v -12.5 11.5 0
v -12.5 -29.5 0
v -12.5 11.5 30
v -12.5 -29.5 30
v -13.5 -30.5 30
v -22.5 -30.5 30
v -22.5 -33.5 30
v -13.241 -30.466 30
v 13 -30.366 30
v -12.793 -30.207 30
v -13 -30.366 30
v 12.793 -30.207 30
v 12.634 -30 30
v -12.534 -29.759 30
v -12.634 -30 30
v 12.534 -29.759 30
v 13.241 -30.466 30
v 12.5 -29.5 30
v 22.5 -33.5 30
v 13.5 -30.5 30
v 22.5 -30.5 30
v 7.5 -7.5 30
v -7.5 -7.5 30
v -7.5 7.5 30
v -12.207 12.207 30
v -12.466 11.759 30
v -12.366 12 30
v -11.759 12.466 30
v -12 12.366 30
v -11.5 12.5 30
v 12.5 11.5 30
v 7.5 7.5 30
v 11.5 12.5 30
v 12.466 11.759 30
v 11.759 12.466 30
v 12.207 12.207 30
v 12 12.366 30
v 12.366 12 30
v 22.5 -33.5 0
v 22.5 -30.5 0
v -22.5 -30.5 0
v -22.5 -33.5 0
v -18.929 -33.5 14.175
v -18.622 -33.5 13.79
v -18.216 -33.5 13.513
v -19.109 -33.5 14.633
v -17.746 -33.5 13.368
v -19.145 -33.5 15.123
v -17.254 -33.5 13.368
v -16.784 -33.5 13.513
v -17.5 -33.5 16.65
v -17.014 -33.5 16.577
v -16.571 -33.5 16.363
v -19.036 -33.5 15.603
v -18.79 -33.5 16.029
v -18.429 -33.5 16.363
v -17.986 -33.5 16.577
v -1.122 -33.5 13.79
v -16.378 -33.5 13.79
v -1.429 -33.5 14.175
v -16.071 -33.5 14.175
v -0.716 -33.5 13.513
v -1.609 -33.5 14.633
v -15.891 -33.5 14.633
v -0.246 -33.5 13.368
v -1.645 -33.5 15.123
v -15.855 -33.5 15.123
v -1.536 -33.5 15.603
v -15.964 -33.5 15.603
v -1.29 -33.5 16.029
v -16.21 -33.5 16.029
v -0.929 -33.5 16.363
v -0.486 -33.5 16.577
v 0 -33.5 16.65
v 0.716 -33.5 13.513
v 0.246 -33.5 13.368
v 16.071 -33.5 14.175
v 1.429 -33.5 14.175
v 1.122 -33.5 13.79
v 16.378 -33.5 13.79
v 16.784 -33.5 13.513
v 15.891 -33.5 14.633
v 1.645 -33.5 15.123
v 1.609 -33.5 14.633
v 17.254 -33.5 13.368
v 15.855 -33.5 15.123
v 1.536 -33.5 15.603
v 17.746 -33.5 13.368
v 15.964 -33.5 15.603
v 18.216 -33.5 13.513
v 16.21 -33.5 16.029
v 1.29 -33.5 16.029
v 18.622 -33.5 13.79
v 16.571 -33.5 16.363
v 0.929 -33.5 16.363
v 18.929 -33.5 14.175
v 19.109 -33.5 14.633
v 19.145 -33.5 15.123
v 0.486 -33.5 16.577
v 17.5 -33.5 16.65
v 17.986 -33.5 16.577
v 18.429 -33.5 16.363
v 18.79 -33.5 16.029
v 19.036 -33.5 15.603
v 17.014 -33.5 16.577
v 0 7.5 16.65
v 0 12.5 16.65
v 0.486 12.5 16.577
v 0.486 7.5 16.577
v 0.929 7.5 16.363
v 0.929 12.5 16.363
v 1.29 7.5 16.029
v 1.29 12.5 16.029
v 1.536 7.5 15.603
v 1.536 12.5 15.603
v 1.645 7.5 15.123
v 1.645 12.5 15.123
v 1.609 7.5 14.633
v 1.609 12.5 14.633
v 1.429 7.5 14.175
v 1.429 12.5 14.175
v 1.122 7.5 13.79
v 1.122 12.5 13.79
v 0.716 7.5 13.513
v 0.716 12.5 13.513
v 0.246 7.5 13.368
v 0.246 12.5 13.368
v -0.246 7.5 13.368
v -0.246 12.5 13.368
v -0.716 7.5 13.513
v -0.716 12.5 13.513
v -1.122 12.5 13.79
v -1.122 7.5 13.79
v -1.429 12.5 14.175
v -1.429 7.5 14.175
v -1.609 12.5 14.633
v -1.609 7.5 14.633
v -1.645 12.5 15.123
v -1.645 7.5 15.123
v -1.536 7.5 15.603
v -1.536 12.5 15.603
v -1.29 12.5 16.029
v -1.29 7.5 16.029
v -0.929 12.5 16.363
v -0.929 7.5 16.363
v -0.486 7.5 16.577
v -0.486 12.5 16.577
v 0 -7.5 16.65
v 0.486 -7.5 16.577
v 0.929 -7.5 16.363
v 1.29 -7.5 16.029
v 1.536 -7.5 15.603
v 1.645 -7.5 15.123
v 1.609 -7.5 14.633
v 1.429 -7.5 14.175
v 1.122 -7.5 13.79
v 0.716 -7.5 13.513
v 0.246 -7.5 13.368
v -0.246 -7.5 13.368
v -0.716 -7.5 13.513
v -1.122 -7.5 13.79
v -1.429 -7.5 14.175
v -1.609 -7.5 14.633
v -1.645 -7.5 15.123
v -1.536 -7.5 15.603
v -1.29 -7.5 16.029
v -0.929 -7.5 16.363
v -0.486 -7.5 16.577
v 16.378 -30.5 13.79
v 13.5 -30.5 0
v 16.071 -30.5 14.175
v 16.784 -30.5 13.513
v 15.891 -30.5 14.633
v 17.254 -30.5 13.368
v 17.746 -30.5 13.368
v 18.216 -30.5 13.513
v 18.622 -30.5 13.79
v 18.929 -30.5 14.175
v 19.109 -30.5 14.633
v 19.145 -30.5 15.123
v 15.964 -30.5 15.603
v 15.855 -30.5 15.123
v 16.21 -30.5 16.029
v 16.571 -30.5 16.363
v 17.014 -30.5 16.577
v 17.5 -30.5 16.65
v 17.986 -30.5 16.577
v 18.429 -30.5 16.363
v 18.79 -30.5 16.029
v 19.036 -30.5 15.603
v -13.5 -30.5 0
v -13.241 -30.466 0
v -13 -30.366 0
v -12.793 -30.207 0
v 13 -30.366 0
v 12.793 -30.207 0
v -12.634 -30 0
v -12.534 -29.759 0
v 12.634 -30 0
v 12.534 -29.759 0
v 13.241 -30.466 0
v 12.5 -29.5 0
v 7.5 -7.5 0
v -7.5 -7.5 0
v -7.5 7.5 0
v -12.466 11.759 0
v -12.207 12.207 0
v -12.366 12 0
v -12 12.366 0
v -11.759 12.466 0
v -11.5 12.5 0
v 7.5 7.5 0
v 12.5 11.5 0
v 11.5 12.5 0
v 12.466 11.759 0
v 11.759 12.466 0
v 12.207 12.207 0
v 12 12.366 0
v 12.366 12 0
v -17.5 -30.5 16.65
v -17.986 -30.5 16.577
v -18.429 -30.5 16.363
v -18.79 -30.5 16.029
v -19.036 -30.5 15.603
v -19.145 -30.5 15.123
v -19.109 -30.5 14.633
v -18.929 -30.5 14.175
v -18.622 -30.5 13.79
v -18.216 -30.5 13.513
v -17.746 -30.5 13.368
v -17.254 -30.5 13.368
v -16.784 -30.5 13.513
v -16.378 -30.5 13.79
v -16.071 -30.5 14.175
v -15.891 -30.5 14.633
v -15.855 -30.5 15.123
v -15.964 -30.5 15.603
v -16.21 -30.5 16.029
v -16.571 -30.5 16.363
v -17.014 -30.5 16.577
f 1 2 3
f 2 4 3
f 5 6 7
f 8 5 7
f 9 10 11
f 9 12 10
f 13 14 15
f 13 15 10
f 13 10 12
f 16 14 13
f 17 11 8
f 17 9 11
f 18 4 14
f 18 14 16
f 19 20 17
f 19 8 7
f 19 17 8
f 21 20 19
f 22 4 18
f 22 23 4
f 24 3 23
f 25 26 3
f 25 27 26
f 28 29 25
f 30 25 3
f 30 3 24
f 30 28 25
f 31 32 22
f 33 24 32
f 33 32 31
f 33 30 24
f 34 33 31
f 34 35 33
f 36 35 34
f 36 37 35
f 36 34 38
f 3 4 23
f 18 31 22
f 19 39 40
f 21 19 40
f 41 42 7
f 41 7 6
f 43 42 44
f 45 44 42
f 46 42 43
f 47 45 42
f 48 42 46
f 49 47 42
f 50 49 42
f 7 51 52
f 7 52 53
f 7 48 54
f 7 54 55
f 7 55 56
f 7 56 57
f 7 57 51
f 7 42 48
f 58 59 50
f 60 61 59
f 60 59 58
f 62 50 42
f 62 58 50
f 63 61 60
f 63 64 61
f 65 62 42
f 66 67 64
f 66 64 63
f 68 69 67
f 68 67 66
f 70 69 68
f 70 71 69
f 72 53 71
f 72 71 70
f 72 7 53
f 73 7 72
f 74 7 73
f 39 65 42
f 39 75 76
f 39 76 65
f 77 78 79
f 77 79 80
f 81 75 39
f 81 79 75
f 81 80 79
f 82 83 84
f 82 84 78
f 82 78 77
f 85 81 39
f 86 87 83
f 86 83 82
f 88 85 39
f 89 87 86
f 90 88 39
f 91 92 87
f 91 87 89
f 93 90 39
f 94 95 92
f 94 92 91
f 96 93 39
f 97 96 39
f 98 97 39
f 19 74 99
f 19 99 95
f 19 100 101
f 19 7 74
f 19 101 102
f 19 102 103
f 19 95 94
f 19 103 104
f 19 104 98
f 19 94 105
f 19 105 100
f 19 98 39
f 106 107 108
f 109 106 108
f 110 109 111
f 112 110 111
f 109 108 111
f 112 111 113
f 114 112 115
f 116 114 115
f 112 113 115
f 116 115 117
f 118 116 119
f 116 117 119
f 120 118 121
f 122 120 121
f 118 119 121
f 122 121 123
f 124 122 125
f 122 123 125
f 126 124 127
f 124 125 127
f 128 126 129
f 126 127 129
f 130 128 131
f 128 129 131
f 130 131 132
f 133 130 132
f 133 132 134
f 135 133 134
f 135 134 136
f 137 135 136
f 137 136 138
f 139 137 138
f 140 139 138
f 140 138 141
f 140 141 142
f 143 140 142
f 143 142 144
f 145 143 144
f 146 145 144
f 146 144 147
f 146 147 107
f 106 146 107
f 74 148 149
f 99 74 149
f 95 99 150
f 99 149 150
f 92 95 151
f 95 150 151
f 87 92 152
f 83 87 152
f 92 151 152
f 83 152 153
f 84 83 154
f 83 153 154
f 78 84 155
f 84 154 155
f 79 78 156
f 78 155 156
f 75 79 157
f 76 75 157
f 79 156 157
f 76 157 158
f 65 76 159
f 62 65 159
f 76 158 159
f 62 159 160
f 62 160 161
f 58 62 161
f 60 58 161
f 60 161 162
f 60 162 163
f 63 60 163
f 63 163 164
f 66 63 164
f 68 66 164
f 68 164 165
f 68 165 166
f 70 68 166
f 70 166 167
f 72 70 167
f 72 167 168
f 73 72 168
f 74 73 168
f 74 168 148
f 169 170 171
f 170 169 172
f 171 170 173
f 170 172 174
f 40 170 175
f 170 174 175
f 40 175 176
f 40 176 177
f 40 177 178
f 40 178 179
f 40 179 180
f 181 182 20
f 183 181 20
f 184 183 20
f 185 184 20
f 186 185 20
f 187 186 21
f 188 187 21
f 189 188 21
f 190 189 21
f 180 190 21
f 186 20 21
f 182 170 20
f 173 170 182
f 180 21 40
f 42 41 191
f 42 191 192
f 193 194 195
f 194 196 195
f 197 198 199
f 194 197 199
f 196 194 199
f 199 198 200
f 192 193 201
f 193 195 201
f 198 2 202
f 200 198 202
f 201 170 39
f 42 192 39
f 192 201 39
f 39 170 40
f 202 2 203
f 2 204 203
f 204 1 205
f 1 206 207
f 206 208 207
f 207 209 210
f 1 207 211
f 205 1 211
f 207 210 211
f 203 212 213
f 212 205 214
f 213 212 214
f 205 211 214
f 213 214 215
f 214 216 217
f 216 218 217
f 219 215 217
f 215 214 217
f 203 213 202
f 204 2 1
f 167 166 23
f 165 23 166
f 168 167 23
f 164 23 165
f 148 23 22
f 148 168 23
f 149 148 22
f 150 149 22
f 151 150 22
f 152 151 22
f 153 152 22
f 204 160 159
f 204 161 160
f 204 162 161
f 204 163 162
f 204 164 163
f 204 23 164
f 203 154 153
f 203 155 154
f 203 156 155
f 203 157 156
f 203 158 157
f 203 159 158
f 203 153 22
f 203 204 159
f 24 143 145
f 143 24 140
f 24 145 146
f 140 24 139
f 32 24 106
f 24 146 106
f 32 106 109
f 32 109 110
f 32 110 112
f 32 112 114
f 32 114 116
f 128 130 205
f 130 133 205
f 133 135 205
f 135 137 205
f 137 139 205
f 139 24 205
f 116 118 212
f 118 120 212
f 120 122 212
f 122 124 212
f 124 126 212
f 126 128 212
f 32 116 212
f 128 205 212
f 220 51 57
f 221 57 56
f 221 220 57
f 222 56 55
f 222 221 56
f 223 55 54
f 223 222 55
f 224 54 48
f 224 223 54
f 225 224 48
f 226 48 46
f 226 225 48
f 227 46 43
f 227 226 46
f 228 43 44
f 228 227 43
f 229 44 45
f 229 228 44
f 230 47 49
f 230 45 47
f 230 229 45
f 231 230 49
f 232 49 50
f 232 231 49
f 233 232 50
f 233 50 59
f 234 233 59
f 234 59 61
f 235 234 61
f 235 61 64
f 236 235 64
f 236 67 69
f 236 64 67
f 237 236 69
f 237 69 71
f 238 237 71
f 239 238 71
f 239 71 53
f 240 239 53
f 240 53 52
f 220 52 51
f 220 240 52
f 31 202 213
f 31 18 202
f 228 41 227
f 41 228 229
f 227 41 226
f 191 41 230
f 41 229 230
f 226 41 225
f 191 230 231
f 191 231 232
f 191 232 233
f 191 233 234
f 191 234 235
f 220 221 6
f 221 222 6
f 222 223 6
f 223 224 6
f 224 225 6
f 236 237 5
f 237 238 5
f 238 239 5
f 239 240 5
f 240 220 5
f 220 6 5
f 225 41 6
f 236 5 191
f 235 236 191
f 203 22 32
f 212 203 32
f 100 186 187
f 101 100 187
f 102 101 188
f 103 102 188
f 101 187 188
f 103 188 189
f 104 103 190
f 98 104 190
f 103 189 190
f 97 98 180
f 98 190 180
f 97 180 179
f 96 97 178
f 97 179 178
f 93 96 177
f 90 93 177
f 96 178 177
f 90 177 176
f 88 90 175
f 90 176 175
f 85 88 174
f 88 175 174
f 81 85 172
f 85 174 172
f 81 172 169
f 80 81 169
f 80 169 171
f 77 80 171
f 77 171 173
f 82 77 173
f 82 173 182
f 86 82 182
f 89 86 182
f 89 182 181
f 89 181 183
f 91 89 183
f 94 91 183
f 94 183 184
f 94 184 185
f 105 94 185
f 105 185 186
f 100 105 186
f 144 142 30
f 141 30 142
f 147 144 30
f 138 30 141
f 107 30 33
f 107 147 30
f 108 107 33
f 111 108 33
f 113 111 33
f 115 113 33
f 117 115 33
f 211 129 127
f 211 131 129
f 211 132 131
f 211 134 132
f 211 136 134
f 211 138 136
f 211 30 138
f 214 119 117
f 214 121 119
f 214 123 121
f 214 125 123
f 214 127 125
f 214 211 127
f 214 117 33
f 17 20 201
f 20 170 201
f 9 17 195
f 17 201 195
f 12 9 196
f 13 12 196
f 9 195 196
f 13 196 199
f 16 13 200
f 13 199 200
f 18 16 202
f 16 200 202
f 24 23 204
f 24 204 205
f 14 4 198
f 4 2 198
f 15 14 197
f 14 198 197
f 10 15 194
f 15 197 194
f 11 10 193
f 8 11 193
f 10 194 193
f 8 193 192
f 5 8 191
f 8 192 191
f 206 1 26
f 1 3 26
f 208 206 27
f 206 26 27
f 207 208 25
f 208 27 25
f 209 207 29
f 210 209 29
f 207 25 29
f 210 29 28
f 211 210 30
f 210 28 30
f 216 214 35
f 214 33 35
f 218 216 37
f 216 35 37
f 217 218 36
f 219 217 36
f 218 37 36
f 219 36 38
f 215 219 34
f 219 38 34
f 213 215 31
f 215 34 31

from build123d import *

# Parameters (mm, degrees)
SKETCH_1_W          = 25
SKETCH_1_H          = 25
SKETCH_1_W_2        = 15
SKETCH_1_H_2        = 15
EXTRUDE_1_DEPTH     = 30
SKETCH_2_W          = 25
SKETCH_2_H          = 18
SKETCH_2_W_2        = 10
SKETCH_2_H_2        = 3
EXTRUDE_2_DEPTH     = 30
SKETCH_3_R          = 1.65
CUT_EXTRUDE_1_DEPTH = 30
SKETCH_4_R          = 1.65
CUT_EXTRUDE_2_DEPTH = 1000
FILLET_1_R          = 1


with BuildPart() as part:
    # 草图1 → 凸台-拉伸1 (new body)
    with BuildSketch(Plane.XY):
        Rectangle(SKETCH_1_W, SKETCH_1_H)
        Rectangle(SKETCH_1_W_2, SKETCH_1_H_2, mode=Mode.SUBTRACT)
    extrude(amount=EXTRUDE_1_DEPTH)

    # 草图2 → 凸台-拉伸2 (add)
    with BuildSketch(Plane.XY.offset(30)):
        with Locations((0, -21.5)):
            Rectangle(SKETCH_2_W, SKETCH_2_H)
        with Locations((-17.5, -32)):
            Rectangle(SKETCH_2_W_2, SKETCH_2_H_2)
        with Locations((0, -32)):
            Rectangle(SKETCH_2_W, SKETCH_2_H_2)
        with Locations((17.5, -32)):
            Rectangle(SKETCH_2_W_2, SKETCH_2_H_2)
    extrude(amount=-EXTRUDE_2_DEPTH)

    # 草图3 → 切除-拉伸1 (cut)
    with BuildSketch(Plane(origin=(0, -30.5, 0), x_dir=(1, 0, 0), z_dir=(0, 1, 0))):
        with Locations(Location((17.5, -15, 0), (0, 0, 270))):
            Circle(SKETCH_3_R)
    cut_extrude_1 = extrude(amount=-CUT_EXTRUDE_1_DEPTH, mode=Mode.SUBTRACT)

    # 镜向1: 切除-拉伸1 across plane
    add(cut_extrude_1.mirror(Plane(origin=(0, 0, 0), x_dir=(0, 0, 1), z_dir=(1, 0, 0))), mode=Mode.SUBTRACT)

    # 草图4 → 切除-拉伸2 (cut)
    with BuildSketch(Plane(origin=(0, 12.5, 0), x_dir=(1, 0, 0), z_dir=(0, 1, 0))):
        with Locations(Location((0, -15, 0), (0, 0, 270))):
            Circle(SKETCH_4_R)
    extrude(amount=-CUT_EXTRUDE_2_DEPTH, mode=Mode.SUBTRACT)

    # 圆角1
    fillet_1_edges = [part.edges().sort_by_distance(p)[0] for p in [
        (-12.5, -30.5, 15),
        (12.5, -30.5, 15),
        (-12.5, 12.5, 15),
        (12.5, 12.5, 15),
    ]]
    fillet(fillet_1_edges, radius=FILLET_1_R)


solid = part.part
